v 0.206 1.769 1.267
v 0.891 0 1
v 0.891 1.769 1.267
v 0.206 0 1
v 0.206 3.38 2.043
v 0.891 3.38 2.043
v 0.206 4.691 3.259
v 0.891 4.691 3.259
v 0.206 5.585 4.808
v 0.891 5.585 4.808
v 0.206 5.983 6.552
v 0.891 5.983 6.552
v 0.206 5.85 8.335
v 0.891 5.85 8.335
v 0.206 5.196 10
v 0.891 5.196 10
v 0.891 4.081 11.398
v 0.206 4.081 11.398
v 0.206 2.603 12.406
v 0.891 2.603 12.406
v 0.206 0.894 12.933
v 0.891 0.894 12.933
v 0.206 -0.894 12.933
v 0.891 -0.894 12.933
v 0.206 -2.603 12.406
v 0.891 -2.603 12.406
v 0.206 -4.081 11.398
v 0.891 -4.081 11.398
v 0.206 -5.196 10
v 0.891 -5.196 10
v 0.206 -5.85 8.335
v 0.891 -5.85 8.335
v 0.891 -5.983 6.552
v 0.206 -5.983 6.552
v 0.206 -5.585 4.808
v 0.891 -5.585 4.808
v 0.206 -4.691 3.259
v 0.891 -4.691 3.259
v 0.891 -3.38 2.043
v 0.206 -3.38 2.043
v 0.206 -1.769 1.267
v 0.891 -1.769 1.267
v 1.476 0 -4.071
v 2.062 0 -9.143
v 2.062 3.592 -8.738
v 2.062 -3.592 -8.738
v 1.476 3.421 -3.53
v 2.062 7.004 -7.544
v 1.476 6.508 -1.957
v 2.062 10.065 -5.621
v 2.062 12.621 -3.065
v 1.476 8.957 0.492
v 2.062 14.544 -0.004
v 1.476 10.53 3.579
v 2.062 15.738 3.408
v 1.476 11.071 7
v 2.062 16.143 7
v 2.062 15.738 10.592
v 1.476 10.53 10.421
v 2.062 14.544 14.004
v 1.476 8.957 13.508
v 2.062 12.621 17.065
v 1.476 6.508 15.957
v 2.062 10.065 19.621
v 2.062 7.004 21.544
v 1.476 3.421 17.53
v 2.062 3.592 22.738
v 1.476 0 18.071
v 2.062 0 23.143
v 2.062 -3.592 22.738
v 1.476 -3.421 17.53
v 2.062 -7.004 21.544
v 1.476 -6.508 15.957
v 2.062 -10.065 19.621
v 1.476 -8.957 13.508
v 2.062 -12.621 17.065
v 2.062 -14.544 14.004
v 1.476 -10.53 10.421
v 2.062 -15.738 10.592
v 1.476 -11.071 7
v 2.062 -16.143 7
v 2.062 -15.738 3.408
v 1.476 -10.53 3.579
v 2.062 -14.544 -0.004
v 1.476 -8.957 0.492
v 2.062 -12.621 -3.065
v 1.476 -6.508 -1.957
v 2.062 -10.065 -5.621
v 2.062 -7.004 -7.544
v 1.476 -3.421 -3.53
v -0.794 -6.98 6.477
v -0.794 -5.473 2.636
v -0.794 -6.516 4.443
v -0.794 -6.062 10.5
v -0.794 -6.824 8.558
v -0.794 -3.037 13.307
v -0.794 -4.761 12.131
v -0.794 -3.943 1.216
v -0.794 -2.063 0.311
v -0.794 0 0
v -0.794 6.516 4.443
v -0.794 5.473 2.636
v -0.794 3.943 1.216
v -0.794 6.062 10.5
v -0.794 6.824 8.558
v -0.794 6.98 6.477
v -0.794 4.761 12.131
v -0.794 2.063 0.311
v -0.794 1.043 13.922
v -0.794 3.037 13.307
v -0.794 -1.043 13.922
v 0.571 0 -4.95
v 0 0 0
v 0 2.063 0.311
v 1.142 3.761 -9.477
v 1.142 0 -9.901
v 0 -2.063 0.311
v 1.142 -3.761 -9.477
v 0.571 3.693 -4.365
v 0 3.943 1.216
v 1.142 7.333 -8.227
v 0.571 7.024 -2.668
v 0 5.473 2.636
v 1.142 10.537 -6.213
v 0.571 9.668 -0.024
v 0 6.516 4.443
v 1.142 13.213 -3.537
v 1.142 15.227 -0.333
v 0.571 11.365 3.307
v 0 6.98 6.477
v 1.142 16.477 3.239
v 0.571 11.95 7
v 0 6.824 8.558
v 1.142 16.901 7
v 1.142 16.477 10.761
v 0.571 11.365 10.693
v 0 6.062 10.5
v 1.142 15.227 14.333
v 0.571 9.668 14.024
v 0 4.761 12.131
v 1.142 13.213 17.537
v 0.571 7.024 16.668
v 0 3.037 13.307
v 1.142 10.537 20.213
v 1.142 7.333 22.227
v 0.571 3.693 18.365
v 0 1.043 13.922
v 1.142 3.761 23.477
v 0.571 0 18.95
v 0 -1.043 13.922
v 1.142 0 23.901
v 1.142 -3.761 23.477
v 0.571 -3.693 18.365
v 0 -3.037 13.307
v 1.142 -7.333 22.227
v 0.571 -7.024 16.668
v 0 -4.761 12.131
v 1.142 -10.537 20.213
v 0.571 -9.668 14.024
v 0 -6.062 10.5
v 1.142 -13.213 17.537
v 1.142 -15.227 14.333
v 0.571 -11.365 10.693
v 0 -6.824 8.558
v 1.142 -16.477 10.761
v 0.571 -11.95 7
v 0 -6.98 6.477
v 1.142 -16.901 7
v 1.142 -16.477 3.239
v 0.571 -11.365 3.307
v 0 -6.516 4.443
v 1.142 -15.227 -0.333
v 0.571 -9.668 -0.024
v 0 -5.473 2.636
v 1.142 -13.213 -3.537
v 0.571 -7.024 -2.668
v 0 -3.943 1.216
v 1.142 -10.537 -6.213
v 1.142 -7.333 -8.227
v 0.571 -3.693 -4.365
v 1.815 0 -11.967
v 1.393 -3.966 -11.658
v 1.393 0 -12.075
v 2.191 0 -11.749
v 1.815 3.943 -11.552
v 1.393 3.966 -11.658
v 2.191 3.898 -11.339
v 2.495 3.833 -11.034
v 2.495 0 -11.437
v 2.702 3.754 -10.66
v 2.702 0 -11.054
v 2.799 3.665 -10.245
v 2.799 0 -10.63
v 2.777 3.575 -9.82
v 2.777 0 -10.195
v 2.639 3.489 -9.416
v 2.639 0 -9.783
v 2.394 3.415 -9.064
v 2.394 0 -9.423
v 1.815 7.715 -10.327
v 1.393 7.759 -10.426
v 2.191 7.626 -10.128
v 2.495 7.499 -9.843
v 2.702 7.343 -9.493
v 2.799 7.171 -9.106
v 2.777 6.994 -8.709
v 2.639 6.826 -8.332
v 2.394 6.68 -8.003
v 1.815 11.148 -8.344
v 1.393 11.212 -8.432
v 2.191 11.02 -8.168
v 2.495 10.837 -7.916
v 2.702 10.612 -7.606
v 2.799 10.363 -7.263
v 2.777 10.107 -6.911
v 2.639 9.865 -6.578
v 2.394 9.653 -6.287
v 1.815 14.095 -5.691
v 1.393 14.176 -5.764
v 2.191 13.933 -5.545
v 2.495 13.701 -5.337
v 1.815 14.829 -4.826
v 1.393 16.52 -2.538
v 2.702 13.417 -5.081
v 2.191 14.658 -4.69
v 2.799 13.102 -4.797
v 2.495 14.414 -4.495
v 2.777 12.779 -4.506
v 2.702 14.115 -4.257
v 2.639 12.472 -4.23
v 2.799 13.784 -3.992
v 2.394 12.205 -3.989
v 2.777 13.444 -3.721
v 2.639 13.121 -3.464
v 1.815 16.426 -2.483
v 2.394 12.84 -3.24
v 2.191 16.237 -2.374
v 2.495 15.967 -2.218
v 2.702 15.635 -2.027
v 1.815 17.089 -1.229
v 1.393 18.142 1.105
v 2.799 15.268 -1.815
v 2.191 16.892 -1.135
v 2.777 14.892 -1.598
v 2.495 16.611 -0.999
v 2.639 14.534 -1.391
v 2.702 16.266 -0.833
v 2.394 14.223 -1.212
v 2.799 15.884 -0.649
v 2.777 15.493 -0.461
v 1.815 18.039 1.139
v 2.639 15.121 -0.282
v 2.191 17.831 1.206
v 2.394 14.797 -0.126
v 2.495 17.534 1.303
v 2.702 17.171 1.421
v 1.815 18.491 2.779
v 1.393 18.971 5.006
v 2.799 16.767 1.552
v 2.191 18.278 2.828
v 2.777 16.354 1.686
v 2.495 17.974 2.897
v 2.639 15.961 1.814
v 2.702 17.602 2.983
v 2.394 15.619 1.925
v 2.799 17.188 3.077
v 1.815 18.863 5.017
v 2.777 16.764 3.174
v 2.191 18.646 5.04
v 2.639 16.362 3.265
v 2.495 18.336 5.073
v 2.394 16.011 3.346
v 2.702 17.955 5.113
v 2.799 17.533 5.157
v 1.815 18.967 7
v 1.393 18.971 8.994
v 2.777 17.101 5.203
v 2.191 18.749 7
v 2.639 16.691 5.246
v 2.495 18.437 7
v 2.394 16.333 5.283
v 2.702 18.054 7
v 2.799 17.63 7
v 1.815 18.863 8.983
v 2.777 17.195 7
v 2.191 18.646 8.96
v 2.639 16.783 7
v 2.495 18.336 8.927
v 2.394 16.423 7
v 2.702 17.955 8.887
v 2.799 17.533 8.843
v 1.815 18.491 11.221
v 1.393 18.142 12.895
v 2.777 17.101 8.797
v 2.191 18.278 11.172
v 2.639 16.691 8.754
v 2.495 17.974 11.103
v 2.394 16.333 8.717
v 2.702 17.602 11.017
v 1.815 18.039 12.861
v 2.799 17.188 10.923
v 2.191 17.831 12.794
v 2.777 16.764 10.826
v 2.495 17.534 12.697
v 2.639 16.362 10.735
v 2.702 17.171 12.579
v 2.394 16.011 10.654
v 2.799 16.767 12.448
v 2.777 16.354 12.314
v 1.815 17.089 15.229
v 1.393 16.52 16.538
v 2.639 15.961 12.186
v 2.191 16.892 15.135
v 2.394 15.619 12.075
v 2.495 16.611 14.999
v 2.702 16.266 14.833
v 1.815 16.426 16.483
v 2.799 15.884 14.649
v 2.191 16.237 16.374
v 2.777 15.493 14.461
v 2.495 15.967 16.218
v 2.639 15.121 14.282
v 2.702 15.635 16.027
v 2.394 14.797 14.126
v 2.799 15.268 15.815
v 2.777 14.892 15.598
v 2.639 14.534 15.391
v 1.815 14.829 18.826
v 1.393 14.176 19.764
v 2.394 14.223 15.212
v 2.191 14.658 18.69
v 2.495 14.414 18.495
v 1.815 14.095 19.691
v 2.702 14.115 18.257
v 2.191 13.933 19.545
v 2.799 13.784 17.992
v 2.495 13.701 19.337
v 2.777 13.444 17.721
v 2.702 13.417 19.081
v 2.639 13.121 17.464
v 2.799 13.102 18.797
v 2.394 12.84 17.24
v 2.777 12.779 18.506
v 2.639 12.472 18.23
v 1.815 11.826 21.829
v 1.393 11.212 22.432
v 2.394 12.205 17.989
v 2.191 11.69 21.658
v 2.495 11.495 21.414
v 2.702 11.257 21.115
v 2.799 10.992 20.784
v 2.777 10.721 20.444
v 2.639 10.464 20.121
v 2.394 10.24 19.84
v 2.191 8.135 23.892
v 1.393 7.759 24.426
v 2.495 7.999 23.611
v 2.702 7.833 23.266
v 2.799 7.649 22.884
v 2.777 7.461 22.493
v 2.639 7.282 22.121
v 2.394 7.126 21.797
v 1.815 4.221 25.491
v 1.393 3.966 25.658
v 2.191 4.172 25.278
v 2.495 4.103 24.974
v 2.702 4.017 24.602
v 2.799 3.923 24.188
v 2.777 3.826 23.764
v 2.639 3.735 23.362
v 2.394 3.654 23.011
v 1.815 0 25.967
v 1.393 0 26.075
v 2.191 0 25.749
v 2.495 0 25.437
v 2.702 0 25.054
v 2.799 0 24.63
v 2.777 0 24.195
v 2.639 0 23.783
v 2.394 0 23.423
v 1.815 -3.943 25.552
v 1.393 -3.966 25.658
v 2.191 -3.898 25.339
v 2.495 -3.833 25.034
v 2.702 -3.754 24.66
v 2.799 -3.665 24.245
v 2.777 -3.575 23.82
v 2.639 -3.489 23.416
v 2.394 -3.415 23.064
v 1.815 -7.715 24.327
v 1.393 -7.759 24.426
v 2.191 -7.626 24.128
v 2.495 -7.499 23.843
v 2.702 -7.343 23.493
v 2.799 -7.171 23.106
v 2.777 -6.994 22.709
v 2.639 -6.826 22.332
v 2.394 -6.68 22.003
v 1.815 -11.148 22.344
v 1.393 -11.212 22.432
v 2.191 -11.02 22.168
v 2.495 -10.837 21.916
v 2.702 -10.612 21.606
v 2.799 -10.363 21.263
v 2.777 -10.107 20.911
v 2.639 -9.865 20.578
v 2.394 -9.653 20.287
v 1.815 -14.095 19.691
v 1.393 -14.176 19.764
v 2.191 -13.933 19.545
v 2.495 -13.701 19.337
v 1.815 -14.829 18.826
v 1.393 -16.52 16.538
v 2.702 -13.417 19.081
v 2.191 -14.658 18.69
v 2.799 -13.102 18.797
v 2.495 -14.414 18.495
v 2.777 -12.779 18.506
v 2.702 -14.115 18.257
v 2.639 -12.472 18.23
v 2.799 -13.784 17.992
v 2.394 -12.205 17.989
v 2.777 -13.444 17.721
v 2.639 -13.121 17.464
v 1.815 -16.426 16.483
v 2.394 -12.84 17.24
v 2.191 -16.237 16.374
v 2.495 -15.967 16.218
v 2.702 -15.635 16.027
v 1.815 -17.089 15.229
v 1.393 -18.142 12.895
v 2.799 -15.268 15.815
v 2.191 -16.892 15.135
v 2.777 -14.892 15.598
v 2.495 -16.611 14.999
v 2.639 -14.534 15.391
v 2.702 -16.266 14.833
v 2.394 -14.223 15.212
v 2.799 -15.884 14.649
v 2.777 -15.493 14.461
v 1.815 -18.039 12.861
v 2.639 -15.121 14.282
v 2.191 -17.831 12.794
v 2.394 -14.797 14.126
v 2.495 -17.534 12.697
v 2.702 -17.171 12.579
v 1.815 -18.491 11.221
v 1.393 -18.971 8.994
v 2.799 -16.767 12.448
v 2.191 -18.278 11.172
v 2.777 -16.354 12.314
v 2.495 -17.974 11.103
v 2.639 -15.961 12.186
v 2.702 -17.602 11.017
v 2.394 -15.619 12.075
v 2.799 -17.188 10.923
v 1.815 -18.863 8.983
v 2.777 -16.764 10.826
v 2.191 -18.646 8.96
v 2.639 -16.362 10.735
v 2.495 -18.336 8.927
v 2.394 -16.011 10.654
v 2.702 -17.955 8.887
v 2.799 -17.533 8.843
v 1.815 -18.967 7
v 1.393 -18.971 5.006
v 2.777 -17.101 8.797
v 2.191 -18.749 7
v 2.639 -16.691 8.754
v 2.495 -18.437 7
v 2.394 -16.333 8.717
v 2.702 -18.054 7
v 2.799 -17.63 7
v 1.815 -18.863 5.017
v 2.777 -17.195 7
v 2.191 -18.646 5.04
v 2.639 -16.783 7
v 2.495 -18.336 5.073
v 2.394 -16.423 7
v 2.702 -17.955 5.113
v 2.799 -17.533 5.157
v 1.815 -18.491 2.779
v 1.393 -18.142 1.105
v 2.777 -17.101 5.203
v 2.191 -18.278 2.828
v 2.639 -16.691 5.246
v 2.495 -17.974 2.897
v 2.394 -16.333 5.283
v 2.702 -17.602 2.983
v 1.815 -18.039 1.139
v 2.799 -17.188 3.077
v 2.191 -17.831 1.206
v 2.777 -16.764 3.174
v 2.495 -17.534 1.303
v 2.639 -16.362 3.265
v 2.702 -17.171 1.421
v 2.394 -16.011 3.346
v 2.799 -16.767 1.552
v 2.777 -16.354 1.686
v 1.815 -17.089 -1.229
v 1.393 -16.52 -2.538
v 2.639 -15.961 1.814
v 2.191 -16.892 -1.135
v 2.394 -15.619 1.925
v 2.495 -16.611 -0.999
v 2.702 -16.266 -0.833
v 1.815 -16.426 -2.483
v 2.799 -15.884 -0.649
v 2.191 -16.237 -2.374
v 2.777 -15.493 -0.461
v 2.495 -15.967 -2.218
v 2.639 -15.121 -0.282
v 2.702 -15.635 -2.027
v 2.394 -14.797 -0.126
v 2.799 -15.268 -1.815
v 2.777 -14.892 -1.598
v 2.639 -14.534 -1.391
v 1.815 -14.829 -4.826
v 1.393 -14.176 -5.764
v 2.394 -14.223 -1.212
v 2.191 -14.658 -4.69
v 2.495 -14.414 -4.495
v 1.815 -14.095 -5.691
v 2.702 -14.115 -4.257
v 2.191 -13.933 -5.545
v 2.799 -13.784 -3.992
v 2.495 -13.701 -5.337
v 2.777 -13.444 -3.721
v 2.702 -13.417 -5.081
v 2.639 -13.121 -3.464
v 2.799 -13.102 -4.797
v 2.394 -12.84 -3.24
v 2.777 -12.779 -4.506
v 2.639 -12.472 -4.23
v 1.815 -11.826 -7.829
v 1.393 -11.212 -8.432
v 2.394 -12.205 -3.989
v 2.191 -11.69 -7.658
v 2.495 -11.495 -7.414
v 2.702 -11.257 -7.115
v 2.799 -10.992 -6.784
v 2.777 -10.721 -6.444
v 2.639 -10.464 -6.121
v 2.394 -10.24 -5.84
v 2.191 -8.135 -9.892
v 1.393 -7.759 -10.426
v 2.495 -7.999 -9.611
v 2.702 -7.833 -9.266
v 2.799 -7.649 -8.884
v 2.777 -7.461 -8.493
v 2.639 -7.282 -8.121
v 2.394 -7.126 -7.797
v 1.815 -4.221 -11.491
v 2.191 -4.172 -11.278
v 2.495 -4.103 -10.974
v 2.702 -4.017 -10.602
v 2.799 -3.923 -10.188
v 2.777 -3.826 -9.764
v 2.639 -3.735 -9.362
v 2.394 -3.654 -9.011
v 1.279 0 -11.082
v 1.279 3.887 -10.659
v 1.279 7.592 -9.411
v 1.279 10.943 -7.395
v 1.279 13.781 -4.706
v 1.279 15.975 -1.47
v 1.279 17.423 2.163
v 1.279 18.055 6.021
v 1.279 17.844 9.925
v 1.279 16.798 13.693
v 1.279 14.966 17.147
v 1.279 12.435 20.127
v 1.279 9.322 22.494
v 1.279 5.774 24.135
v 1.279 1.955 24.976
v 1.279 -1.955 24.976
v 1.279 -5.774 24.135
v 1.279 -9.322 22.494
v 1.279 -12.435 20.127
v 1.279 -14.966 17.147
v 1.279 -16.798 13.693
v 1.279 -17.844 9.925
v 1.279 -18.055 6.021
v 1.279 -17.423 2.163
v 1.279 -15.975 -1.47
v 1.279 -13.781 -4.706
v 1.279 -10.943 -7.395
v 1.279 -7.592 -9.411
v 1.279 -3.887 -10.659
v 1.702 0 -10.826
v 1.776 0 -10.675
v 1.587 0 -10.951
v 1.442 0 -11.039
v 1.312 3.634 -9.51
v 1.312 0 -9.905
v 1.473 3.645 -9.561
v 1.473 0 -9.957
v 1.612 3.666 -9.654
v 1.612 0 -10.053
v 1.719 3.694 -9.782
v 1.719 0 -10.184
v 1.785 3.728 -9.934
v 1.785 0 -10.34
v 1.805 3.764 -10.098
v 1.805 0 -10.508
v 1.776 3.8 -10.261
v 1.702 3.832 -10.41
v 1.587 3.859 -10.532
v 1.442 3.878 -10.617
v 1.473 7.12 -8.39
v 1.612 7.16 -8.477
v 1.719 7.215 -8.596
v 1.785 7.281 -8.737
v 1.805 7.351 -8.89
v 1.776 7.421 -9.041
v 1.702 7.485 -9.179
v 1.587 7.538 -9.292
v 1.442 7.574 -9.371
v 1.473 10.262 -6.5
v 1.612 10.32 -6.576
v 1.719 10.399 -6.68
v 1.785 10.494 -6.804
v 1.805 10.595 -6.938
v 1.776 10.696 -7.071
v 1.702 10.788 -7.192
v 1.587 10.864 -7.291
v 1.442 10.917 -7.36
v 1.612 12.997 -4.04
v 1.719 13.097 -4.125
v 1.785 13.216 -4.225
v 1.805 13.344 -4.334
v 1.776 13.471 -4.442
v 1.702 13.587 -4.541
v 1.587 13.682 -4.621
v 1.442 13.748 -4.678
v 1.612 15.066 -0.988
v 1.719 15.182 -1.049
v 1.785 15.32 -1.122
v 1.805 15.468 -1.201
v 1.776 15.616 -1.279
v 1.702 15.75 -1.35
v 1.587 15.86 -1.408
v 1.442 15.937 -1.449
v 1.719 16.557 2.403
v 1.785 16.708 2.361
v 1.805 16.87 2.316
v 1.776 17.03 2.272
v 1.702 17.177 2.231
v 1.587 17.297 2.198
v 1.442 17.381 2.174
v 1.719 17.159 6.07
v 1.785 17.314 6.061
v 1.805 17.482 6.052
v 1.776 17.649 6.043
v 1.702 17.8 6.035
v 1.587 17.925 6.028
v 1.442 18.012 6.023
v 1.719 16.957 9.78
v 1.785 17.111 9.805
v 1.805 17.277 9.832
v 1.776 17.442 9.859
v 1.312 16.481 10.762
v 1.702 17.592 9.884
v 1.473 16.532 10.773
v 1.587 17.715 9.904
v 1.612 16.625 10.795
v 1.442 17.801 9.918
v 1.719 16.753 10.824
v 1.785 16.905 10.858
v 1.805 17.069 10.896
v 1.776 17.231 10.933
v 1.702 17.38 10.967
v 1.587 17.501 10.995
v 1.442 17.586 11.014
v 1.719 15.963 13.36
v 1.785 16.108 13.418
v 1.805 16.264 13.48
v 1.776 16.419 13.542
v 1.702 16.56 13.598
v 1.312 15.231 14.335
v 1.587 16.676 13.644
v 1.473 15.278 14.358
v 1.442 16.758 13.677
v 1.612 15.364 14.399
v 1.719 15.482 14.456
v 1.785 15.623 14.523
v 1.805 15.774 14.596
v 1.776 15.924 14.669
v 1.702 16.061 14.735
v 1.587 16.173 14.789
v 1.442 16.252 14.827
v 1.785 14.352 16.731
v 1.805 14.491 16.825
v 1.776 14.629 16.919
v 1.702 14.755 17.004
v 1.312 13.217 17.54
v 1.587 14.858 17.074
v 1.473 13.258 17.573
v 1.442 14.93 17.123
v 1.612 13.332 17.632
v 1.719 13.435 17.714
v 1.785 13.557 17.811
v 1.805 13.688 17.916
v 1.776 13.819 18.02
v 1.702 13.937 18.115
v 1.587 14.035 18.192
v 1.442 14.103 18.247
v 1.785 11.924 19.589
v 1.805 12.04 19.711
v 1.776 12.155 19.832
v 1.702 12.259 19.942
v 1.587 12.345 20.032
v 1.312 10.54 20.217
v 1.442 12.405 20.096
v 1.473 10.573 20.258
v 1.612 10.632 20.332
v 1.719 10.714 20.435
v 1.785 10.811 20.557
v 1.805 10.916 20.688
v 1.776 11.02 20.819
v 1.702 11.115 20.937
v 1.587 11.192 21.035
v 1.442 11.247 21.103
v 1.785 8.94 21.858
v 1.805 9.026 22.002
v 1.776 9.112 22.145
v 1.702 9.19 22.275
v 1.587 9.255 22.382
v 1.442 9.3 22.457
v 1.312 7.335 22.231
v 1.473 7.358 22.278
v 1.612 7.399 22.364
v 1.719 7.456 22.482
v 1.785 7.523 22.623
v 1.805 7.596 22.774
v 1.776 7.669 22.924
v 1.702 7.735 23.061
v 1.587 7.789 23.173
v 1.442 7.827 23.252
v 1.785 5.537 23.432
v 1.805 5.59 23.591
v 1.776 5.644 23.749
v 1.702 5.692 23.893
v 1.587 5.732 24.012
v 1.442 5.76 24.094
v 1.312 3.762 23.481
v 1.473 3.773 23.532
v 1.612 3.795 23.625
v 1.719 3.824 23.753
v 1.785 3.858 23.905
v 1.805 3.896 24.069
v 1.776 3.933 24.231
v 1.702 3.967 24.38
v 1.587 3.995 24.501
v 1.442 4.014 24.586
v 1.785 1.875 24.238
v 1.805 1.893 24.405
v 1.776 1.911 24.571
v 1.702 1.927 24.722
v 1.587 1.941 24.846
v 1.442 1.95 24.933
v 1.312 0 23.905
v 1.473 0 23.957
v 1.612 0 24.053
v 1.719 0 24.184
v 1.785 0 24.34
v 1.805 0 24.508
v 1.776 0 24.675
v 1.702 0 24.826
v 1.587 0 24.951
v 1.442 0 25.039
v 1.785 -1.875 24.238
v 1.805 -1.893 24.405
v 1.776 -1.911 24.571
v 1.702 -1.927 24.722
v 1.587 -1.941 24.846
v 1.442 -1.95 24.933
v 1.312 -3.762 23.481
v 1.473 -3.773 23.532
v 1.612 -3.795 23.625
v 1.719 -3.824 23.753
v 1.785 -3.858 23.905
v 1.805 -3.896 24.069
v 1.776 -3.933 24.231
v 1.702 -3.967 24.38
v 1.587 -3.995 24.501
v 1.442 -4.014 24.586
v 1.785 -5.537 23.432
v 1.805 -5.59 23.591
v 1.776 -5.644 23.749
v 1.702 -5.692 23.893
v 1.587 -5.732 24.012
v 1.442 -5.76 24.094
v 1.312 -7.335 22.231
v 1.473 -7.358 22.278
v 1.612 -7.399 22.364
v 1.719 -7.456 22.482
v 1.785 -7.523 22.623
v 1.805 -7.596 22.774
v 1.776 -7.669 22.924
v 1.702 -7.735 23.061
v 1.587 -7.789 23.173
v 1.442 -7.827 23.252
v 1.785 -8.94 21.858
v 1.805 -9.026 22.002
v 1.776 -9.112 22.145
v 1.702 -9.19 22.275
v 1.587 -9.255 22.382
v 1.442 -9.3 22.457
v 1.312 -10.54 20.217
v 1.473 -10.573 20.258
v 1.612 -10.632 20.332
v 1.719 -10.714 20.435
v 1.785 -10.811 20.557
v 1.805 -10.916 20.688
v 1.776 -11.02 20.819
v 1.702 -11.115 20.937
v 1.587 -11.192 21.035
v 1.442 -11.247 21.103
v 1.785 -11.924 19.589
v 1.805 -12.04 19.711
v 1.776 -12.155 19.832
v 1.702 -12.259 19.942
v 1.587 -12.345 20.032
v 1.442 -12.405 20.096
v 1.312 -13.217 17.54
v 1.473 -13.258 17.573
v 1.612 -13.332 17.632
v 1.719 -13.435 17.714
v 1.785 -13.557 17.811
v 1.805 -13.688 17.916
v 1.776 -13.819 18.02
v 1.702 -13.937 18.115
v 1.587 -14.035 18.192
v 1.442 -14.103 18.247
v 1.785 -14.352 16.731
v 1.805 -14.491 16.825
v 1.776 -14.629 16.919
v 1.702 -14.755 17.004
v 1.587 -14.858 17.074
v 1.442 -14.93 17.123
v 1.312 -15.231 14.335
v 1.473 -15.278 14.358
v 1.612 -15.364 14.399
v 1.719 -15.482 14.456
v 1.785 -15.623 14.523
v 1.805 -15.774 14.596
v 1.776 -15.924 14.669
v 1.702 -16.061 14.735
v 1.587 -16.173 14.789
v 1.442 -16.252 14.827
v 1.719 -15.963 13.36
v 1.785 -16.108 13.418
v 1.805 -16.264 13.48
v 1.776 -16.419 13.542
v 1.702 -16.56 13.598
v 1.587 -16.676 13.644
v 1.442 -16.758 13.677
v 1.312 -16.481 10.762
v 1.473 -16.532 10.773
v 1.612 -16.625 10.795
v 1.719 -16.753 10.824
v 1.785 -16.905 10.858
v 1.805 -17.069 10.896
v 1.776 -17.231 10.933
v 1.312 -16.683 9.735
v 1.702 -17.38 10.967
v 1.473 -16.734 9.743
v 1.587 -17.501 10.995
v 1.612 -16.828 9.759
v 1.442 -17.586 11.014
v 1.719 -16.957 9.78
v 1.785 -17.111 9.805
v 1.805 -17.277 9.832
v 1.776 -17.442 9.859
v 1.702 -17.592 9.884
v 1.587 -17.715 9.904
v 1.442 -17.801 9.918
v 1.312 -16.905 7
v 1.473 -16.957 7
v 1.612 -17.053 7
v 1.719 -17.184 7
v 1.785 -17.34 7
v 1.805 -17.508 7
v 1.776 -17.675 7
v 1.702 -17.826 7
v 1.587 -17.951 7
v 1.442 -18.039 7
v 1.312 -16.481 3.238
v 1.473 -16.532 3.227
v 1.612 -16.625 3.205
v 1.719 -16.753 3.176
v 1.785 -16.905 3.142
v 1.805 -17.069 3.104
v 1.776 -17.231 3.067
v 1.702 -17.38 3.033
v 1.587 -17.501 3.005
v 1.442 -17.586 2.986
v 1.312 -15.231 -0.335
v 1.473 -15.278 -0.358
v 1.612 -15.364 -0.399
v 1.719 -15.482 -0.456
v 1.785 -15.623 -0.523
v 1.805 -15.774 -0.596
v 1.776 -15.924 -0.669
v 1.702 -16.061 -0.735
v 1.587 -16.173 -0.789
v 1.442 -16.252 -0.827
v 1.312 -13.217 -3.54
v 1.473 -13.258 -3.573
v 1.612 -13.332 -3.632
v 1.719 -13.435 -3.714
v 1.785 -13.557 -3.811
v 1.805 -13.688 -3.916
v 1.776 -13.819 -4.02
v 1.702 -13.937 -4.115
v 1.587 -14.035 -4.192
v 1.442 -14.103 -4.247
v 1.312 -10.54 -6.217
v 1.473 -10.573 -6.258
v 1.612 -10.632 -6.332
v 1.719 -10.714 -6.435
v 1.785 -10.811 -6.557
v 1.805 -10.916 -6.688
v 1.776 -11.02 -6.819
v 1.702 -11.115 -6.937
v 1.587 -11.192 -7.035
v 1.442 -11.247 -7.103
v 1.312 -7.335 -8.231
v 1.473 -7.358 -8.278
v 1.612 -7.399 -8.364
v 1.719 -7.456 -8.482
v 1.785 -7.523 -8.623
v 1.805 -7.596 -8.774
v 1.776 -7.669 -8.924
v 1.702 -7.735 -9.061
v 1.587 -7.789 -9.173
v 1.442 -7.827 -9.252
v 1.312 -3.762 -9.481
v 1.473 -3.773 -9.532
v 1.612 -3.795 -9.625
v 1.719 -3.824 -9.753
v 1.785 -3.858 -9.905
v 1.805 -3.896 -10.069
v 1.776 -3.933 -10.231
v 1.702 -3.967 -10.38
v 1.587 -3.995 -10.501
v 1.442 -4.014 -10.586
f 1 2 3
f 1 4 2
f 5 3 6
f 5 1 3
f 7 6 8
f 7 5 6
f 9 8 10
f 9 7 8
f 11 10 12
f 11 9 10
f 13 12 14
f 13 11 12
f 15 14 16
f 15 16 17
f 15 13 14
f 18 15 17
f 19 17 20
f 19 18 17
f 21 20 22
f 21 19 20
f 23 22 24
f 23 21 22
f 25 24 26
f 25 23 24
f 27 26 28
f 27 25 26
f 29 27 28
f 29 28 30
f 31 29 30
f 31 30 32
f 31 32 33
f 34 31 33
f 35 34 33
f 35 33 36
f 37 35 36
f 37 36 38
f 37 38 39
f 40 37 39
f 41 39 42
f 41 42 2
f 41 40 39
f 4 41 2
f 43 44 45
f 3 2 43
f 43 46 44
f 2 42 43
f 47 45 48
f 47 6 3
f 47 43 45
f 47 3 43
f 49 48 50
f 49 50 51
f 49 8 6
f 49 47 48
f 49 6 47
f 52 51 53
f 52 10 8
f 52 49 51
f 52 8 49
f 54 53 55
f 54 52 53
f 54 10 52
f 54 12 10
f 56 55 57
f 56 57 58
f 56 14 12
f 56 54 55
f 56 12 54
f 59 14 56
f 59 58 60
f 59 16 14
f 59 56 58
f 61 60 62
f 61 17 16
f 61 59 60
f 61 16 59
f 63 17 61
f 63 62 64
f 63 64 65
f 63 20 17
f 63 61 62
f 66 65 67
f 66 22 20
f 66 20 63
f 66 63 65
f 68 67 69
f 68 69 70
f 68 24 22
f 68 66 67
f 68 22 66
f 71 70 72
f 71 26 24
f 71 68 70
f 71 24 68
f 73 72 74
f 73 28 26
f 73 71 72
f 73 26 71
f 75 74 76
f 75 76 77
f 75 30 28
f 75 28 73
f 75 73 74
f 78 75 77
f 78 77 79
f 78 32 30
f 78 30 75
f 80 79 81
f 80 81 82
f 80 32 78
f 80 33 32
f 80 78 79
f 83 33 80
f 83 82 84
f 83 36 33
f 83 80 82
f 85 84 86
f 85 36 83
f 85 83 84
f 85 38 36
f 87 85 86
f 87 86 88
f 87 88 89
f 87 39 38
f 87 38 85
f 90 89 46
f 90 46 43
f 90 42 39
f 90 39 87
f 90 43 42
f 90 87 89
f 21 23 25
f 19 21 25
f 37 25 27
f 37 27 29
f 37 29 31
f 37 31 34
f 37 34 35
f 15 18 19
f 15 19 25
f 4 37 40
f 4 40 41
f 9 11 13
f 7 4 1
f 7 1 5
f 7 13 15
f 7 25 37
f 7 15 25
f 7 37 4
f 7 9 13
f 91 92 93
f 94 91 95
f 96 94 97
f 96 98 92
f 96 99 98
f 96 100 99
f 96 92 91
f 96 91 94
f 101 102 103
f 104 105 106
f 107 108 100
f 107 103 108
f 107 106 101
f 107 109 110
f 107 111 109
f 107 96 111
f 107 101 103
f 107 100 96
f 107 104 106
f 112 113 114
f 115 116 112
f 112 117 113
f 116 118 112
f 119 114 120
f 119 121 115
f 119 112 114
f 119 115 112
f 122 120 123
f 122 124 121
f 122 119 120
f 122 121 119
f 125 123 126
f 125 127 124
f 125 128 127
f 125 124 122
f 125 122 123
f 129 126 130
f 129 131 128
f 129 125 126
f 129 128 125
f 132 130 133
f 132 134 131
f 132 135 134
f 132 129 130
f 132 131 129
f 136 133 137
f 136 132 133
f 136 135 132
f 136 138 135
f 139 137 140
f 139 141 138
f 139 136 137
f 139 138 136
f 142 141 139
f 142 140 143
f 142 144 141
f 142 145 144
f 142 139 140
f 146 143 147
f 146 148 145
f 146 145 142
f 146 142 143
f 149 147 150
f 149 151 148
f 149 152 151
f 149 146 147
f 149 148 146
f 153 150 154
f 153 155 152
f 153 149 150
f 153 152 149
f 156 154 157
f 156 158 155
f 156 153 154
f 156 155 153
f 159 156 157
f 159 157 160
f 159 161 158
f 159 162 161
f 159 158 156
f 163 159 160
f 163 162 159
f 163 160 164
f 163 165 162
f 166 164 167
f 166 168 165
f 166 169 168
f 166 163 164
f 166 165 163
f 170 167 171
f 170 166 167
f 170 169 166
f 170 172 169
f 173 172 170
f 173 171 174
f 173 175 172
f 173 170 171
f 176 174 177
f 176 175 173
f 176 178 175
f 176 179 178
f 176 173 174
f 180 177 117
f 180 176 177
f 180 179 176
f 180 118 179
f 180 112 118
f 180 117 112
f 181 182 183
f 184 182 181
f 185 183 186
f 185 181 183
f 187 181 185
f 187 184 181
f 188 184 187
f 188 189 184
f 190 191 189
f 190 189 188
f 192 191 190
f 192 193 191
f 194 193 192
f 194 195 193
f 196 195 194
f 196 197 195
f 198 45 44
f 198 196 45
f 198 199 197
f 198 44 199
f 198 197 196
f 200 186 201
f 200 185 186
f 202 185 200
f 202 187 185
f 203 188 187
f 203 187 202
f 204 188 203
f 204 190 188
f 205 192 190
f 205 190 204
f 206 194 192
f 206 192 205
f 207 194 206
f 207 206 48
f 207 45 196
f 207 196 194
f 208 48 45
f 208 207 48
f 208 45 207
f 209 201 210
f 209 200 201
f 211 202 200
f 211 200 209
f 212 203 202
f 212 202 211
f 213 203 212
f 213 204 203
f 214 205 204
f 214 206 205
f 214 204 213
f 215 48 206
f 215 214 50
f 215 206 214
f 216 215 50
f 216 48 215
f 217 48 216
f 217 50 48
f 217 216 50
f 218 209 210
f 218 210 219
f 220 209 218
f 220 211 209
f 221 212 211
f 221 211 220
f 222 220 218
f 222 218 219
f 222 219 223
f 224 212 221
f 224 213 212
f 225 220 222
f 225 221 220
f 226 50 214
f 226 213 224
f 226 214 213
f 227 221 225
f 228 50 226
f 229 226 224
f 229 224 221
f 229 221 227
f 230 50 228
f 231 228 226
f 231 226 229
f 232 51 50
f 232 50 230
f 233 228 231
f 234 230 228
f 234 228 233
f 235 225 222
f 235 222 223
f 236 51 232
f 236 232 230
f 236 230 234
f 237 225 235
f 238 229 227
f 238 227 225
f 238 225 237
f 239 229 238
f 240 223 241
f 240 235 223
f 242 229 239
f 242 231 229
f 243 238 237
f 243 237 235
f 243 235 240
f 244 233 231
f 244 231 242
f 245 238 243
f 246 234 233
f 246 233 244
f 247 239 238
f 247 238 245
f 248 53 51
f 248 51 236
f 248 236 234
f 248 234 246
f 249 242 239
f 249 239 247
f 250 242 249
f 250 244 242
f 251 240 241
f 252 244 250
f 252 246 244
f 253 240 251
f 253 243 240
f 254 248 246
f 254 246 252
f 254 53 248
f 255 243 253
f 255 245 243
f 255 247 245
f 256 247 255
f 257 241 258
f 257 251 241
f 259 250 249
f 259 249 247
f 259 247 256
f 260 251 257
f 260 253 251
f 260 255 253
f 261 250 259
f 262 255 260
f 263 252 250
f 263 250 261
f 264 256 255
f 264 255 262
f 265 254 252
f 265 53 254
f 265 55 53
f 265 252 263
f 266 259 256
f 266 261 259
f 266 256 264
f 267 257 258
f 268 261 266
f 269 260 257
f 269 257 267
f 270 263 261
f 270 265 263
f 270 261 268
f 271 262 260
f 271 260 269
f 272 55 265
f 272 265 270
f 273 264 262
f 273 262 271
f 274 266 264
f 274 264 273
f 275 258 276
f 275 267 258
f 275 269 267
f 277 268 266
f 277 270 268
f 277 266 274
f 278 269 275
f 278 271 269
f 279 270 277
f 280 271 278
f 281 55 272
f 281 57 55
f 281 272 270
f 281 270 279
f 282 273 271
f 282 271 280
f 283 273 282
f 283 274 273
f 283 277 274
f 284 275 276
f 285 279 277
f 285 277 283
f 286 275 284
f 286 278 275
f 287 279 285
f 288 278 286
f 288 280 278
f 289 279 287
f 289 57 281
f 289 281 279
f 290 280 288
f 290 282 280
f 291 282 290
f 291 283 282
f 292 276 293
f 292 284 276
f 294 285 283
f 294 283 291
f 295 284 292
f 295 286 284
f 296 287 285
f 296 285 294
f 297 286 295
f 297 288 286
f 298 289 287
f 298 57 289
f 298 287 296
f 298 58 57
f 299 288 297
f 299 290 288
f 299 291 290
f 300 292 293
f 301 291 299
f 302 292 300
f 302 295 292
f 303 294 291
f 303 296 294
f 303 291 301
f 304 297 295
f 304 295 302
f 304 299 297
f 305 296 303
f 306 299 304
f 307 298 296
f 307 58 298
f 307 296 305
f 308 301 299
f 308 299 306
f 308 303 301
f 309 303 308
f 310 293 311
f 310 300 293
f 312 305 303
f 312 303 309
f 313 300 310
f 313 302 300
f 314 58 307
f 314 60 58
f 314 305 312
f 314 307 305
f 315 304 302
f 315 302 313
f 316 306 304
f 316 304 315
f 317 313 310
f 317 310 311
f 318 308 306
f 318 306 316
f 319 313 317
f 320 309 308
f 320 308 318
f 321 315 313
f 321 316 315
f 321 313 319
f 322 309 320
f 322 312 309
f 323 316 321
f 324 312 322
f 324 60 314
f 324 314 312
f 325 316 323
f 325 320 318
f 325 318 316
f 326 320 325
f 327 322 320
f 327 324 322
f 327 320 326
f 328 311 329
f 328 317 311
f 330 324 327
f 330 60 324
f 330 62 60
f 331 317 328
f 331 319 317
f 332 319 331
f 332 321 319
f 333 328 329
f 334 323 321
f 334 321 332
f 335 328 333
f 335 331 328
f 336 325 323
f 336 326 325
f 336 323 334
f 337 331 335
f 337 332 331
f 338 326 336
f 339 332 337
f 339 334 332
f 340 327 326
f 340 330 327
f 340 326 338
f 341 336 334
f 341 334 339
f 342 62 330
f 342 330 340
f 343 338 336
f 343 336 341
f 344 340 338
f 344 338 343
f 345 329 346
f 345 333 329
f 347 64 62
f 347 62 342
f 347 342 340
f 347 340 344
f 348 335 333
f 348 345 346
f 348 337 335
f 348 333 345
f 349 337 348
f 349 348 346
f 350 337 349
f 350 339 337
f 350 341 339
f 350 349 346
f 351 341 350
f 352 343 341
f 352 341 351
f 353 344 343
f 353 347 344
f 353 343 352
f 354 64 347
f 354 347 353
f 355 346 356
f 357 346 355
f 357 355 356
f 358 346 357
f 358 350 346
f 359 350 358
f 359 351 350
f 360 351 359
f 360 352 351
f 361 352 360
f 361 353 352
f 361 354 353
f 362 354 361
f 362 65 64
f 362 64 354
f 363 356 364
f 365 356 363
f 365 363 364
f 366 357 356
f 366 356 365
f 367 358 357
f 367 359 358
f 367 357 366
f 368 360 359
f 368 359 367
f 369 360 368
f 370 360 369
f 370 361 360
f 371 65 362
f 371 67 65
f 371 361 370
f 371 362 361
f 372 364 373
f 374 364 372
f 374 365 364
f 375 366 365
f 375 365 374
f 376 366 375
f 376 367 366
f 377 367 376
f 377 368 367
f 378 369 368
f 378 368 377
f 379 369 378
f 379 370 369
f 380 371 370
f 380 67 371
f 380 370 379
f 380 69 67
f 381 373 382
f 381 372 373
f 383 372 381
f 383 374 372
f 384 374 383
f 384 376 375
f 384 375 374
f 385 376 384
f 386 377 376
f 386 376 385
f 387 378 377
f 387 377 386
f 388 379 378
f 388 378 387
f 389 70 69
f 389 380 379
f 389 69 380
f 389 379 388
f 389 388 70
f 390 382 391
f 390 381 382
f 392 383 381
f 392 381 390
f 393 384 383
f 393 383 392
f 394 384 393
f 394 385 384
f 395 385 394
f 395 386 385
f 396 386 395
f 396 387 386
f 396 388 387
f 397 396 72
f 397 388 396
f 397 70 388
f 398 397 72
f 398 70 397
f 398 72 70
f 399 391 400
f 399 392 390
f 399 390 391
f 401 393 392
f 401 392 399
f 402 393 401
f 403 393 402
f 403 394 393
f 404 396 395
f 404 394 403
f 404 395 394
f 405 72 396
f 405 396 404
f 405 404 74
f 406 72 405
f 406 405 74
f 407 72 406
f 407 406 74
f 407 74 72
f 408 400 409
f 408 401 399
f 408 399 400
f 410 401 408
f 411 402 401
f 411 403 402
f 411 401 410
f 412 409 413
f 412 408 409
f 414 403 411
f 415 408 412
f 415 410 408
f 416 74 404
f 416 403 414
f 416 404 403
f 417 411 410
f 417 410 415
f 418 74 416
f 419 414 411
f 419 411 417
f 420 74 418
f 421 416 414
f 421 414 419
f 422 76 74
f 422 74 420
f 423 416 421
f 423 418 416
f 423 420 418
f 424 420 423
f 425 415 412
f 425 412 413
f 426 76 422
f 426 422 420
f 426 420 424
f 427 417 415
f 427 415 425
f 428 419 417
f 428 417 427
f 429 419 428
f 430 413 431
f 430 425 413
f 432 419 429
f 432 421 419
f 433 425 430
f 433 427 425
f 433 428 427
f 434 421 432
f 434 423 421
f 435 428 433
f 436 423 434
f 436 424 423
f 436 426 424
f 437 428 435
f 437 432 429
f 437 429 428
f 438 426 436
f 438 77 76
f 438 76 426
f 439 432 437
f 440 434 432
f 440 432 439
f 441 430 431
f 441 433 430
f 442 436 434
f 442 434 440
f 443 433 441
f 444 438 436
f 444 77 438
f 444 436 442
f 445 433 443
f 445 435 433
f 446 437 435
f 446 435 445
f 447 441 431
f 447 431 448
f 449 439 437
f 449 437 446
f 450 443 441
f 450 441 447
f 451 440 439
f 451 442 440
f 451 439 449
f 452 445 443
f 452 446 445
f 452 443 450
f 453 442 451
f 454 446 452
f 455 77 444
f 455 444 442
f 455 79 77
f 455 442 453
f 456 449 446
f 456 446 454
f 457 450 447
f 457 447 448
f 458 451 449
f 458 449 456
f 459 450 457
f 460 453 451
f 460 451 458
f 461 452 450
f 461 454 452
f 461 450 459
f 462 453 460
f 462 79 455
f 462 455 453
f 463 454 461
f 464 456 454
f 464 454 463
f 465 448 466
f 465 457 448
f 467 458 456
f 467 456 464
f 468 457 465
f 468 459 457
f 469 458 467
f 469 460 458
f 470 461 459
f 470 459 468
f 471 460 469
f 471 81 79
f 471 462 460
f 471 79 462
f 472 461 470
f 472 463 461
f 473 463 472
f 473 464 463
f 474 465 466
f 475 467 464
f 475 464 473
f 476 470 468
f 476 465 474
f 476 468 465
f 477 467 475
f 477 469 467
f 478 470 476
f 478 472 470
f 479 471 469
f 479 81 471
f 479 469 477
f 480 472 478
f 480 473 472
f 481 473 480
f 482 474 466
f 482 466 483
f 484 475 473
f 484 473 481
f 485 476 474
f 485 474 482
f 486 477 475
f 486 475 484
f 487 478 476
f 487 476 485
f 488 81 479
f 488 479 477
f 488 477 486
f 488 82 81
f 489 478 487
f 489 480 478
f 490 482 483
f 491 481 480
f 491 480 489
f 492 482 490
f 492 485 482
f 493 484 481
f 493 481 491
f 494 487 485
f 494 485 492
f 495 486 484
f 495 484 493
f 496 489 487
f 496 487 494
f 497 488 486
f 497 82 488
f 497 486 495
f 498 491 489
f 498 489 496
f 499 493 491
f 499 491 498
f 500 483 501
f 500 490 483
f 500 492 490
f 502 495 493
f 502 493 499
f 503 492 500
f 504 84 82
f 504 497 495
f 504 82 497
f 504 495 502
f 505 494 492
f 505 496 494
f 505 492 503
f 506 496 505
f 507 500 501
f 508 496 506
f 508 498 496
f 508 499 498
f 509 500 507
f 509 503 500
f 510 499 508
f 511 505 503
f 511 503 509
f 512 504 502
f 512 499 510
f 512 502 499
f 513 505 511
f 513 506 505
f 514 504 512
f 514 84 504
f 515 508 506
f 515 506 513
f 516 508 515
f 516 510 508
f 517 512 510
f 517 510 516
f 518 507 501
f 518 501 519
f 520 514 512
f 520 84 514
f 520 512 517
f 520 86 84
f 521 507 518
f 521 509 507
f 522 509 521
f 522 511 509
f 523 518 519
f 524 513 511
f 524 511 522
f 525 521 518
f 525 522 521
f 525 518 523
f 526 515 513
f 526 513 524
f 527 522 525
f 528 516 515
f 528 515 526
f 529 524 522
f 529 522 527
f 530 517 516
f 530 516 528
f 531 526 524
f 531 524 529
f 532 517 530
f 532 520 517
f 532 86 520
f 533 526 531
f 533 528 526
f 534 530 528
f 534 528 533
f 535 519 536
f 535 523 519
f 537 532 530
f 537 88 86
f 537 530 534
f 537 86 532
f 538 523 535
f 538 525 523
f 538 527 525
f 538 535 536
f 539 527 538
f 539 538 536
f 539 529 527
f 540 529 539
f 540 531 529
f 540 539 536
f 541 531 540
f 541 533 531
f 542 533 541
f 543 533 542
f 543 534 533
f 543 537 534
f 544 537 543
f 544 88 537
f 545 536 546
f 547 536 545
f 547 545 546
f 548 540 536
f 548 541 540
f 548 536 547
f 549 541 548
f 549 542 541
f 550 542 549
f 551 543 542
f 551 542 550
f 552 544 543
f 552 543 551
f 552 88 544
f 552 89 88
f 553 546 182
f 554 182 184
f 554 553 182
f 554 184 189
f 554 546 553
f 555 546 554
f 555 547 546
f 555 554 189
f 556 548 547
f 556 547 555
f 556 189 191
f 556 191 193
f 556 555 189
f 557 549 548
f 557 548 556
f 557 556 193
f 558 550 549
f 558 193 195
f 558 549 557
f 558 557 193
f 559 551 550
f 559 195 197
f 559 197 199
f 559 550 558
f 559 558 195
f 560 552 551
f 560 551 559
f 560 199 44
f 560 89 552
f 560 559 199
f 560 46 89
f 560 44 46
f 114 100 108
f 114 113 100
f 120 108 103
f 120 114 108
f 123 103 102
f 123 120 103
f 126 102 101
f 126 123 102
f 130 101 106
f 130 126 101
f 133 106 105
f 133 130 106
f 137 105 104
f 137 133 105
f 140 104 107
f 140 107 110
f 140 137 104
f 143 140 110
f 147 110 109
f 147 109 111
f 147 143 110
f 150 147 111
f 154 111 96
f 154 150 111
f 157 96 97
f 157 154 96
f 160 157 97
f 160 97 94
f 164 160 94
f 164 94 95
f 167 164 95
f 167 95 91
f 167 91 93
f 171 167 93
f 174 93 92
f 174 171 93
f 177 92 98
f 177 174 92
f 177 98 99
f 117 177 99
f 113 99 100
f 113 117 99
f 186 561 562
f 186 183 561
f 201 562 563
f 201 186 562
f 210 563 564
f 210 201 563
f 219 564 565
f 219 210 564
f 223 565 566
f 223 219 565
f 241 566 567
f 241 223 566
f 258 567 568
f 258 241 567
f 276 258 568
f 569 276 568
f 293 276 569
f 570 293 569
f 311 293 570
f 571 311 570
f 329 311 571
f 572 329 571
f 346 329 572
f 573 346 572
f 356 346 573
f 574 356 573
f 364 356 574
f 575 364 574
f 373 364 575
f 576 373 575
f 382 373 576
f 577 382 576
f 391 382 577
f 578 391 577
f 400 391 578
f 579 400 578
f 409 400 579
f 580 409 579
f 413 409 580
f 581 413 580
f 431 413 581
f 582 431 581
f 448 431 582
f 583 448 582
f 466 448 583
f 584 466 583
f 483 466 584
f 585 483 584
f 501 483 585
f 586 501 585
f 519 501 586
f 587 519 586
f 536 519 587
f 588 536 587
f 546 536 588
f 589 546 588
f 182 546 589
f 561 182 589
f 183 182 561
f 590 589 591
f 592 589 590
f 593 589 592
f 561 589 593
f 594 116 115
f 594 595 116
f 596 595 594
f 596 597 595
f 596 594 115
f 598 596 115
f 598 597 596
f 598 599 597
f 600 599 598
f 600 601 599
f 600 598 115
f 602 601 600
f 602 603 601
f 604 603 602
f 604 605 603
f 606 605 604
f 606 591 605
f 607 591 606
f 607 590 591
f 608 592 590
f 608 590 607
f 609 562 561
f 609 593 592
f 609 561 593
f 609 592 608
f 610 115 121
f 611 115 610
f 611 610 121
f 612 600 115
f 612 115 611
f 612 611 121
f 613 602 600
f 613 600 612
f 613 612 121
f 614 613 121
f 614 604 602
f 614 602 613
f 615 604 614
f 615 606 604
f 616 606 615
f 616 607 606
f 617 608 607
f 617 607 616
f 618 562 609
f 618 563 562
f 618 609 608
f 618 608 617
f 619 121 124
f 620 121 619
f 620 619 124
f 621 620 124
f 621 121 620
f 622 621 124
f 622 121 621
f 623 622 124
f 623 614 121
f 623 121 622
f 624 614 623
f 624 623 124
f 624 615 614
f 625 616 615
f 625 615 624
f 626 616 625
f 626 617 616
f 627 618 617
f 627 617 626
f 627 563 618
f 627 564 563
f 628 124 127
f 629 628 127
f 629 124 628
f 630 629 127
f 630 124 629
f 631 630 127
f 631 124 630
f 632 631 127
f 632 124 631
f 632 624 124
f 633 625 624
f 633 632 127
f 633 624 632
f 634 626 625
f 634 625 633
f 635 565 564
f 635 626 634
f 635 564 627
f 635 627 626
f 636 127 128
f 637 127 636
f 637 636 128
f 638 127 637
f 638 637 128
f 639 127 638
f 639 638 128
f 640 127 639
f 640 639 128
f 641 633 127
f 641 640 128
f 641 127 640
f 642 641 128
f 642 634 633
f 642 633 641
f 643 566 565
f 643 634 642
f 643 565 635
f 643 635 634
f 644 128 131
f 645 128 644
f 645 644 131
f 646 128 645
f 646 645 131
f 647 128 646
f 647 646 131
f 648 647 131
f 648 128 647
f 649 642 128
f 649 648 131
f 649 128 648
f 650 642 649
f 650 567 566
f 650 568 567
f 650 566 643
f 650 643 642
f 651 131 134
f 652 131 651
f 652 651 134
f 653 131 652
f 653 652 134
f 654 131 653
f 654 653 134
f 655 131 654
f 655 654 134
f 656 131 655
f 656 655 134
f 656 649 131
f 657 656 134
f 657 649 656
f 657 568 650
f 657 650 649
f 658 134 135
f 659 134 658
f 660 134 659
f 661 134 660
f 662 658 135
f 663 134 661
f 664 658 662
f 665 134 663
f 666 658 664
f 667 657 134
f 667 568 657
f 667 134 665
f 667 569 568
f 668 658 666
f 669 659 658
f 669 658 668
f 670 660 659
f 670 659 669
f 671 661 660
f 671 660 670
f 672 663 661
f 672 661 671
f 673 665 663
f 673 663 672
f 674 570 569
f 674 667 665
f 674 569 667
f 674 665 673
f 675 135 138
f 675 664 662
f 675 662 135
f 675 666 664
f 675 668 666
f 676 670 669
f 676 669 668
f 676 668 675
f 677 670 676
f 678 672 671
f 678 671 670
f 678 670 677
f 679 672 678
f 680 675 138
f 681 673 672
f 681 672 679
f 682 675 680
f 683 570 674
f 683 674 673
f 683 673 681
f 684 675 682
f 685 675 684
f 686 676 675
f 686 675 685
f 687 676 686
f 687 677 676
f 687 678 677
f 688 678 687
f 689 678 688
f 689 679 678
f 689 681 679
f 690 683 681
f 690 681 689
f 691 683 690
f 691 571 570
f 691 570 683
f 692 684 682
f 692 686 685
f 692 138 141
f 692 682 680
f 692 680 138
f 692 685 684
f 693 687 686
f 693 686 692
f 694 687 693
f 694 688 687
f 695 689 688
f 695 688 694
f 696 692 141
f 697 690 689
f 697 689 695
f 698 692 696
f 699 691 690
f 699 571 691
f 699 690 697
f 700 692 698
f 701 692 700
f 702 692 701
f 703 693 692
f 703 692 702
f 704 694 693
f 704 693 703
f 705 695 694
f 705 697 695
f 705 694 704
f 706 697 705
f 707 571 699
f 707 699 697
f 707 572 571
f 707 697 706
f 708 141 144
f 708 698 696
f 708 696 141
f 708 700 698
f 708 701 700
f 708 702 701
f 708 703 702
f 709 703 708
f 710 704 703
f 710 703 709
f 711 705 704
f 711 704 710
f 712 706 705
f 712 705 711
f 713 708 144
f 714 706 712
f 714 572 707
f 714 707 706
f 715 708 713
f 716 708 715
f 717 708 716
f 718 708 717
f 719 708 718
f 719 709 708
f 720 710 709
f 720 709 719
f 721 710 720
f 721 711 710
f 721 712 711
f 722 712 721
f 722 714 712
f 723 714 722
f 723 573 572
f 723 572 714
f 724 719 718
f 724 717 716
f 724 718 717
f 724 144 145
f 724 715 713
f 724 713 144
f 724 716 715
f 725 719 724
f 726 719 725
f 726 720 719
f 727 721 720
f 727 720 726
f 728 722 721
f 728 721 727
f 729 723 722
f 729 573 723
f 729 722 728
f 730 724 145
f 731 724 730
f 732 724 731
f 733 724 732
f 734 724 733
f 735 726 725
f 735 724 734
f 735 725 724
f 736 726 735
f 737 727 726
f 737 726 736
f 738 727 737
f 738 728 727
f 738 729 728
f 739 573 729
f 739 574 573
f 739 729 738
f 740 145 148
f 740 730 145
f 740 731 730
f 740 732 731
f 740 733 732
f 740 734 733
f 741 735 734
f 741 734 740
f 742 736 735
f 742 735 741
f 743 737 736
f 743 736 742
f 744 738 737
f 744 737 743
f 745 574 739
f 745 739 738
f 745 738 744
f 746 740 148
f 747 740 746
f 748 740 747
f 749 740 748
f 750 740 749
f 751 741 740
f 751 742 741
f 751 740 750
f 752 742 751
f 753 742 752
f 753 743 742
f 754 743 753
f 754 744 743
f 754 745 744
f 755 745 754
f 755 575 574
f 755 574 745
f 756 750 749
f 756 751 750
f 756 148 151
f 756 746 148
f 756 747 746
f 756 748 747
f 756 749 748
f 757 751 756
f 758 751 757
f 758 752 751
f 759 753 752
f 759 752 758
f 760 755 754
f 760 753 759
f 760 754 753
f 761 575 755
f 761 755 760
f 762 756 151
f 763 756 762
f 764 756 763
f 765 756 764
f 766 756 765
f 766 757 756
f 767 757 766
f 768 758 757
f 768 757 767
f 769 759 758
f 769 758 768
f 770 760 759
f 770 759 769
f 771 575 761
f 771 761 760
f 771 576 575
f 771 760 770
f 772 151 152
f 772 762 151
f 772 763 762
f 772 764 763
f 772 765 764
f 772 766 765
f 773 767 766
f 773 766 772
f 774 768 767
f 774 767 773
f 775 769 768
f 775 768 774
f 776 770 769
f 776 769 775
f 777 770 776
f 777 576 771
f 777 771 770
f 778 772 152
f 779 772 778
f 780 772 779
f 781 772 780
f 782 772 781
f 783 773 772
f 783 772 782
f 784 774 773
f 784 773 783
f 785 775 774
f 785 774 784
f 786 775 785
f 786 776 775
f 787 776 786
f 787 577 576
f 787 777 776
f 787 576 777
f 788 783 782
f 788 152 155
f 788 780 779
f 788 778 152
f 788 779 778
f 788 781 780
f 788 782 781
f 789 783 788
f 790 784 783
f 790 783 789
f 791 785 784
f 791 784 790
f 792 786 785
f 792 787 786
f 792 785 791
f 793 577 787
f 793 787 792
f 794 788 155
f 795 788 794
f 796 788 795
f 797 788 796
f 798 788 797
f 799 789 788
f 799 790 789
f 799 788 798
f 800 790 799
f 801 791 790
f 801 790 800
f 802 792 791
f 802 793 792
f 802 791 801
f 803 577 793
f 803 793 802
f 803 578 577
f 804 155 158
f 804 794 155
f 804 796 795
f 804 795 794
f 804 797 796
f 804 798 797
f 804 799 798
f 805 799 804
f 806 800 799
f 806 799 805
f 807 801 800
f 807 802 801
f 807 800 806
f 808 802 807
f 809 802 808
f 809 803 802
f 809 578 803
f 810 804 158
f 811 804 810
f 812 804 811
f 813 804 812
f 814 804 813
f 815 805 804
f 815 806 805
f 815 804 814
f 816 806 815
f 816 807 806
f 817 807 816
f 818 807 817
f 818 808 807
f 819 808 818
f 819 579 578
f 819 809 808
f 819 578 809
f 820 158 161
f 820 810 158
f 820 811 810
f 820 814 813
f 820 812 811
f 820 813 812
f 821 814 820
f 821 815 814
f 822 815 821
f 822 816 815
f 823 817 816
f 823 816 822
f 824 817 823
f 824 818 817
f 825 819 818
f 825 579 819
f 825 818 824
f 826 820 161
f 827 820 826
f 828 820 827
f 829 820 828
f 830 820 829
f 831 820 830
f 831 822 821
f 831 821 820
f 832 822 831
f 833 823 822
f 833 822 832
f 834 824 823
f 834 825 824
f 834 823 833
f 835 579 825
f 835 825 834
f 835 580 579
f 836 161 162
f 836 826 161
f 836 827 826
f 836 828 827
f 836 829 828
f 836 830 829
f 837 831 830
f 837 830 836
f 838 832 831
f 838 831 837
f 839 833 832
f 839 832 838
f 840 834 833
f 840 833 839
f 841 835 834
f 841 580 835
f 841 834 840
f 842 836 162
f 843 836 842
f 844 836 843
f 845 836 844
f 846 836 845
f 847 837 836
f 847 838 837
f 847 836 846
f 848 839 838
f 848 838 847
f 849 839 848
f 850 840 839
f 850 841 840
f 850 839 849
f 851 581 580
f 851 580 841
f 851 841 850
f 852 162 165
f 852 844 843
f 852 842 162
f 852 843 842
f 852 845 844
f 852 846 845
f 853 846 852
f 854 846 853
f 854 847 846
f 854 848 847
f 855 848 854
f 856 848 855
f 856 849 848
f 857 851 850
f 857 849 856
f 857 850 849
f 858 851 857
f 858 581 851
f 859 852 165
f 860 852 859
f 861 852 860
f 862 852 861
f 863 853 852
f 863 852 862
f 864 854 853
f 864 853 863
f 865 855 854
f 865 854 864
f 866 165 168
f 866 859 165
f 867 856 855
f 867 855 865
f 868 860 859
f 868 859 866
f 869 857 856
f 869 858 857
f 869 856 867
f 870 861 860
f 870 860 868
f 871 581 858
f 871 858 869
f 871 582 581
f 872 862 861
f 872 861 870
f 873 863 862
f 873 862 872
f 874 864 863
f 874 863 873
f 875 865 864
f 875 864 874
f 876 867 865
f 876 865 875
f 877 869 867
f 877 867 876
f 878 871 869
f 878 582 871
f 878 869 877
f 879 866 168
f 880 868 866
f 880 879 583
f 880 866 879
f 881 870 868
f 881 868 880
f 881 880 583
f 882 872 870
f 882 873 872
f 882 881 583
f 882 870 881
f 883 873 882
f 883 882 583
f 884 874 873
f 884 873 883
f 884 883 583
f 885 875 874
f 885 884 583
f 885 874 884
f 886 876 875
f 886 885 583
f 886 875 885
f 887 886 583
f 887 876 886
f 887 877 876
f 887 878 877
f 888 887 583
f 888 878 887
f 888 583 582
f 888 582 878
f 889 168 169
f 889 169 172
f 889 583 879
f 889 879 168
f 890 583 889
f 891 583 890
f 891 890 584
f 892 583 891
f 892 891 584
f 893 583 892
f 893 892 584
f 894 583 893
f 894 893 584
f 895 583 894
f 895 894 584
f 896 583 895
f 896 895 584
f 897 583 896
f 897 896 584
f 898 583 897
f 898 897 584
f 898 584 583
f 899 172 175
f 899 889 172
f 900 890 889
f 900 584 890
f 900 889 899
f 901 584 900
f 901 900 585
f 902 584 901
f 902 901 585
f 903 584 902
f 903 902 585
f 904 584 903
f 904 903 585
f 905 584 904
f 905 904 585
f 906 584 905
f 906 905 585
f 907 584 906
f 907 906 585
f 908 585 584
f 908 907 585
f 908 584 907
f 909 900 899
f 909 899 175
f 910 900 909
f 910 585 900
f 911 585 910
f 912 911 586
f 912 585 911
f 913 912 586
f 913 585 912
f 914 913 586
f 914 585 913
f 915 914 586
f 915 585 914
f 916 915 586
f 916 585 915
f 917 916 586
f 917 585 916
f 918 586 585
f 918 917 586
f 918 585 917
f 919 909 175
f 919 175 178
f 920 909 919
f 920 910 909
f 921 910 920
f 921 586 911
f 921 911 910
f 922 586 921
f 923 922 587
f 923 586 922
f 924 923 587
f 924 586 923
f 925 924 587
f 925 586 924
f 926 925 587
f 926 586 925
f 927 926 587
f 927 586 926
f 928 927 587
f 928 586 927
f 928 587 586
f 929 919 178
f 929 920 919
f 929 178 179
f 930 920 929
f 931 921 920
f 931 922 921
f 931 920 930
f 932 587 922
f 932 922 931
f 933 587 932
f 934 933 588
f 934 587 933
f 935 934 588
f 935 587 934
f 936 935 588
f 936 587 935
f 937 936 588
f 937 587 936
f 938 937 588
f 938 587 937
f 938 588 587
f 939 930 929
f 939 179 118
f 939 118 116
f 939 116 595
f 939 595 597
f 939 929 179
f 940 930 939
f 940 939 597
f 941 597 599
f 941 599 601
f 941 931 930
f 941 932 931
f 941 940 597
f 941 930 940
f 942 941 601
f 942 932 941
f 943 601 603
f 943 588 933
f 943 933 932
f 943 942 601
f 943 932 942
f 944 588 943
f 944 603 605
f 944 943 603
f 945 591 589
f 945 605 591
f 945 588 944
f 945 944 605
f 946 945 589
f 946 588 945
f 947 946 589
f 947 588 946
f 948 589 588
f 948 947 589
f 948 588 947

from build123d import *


with BuildPart() as part:
    # Sketch1 → Revolve-Thin3 (revolve)
    with BuildSketch(Plane(origin=(0, 0, 0), x_dir=(1, 0, 0), z_dir=(0, 1, 0))):
        with BuildLine():
            Line((-0.794424497, -7), (-0.794424497, 0))
            Line((-0.794424497, 0), (0, 0))
            Line((0, 0), (1.142372775, 9.900564049))
            ThreePointArc((1.142372775, 9.900564049), (1.801141725, 10.423035974), (1.278669799, 11.081804924))
            Line((1.278669799, 11.081804924), (1.393293907, 12.07521386))
            ThreePointArc((1.393293907, 12.07521386), (2.765201716, 10.845477658), (2.061567501, 9.142750125))
            Line((2.061567501, 9.142750125), (0.891250179, -1))
            Line((0.891250179, -1), (0.205575503, -1))
            Line((0.205575503, -1), (0.205575503, -7))
            Line((0.205575503, -7), (-0.794424497, -7))
        make_face()
    revolve(axis=Axis((-0.794424497, 0, 7), (1, 0, 0)))


solid = part.part
